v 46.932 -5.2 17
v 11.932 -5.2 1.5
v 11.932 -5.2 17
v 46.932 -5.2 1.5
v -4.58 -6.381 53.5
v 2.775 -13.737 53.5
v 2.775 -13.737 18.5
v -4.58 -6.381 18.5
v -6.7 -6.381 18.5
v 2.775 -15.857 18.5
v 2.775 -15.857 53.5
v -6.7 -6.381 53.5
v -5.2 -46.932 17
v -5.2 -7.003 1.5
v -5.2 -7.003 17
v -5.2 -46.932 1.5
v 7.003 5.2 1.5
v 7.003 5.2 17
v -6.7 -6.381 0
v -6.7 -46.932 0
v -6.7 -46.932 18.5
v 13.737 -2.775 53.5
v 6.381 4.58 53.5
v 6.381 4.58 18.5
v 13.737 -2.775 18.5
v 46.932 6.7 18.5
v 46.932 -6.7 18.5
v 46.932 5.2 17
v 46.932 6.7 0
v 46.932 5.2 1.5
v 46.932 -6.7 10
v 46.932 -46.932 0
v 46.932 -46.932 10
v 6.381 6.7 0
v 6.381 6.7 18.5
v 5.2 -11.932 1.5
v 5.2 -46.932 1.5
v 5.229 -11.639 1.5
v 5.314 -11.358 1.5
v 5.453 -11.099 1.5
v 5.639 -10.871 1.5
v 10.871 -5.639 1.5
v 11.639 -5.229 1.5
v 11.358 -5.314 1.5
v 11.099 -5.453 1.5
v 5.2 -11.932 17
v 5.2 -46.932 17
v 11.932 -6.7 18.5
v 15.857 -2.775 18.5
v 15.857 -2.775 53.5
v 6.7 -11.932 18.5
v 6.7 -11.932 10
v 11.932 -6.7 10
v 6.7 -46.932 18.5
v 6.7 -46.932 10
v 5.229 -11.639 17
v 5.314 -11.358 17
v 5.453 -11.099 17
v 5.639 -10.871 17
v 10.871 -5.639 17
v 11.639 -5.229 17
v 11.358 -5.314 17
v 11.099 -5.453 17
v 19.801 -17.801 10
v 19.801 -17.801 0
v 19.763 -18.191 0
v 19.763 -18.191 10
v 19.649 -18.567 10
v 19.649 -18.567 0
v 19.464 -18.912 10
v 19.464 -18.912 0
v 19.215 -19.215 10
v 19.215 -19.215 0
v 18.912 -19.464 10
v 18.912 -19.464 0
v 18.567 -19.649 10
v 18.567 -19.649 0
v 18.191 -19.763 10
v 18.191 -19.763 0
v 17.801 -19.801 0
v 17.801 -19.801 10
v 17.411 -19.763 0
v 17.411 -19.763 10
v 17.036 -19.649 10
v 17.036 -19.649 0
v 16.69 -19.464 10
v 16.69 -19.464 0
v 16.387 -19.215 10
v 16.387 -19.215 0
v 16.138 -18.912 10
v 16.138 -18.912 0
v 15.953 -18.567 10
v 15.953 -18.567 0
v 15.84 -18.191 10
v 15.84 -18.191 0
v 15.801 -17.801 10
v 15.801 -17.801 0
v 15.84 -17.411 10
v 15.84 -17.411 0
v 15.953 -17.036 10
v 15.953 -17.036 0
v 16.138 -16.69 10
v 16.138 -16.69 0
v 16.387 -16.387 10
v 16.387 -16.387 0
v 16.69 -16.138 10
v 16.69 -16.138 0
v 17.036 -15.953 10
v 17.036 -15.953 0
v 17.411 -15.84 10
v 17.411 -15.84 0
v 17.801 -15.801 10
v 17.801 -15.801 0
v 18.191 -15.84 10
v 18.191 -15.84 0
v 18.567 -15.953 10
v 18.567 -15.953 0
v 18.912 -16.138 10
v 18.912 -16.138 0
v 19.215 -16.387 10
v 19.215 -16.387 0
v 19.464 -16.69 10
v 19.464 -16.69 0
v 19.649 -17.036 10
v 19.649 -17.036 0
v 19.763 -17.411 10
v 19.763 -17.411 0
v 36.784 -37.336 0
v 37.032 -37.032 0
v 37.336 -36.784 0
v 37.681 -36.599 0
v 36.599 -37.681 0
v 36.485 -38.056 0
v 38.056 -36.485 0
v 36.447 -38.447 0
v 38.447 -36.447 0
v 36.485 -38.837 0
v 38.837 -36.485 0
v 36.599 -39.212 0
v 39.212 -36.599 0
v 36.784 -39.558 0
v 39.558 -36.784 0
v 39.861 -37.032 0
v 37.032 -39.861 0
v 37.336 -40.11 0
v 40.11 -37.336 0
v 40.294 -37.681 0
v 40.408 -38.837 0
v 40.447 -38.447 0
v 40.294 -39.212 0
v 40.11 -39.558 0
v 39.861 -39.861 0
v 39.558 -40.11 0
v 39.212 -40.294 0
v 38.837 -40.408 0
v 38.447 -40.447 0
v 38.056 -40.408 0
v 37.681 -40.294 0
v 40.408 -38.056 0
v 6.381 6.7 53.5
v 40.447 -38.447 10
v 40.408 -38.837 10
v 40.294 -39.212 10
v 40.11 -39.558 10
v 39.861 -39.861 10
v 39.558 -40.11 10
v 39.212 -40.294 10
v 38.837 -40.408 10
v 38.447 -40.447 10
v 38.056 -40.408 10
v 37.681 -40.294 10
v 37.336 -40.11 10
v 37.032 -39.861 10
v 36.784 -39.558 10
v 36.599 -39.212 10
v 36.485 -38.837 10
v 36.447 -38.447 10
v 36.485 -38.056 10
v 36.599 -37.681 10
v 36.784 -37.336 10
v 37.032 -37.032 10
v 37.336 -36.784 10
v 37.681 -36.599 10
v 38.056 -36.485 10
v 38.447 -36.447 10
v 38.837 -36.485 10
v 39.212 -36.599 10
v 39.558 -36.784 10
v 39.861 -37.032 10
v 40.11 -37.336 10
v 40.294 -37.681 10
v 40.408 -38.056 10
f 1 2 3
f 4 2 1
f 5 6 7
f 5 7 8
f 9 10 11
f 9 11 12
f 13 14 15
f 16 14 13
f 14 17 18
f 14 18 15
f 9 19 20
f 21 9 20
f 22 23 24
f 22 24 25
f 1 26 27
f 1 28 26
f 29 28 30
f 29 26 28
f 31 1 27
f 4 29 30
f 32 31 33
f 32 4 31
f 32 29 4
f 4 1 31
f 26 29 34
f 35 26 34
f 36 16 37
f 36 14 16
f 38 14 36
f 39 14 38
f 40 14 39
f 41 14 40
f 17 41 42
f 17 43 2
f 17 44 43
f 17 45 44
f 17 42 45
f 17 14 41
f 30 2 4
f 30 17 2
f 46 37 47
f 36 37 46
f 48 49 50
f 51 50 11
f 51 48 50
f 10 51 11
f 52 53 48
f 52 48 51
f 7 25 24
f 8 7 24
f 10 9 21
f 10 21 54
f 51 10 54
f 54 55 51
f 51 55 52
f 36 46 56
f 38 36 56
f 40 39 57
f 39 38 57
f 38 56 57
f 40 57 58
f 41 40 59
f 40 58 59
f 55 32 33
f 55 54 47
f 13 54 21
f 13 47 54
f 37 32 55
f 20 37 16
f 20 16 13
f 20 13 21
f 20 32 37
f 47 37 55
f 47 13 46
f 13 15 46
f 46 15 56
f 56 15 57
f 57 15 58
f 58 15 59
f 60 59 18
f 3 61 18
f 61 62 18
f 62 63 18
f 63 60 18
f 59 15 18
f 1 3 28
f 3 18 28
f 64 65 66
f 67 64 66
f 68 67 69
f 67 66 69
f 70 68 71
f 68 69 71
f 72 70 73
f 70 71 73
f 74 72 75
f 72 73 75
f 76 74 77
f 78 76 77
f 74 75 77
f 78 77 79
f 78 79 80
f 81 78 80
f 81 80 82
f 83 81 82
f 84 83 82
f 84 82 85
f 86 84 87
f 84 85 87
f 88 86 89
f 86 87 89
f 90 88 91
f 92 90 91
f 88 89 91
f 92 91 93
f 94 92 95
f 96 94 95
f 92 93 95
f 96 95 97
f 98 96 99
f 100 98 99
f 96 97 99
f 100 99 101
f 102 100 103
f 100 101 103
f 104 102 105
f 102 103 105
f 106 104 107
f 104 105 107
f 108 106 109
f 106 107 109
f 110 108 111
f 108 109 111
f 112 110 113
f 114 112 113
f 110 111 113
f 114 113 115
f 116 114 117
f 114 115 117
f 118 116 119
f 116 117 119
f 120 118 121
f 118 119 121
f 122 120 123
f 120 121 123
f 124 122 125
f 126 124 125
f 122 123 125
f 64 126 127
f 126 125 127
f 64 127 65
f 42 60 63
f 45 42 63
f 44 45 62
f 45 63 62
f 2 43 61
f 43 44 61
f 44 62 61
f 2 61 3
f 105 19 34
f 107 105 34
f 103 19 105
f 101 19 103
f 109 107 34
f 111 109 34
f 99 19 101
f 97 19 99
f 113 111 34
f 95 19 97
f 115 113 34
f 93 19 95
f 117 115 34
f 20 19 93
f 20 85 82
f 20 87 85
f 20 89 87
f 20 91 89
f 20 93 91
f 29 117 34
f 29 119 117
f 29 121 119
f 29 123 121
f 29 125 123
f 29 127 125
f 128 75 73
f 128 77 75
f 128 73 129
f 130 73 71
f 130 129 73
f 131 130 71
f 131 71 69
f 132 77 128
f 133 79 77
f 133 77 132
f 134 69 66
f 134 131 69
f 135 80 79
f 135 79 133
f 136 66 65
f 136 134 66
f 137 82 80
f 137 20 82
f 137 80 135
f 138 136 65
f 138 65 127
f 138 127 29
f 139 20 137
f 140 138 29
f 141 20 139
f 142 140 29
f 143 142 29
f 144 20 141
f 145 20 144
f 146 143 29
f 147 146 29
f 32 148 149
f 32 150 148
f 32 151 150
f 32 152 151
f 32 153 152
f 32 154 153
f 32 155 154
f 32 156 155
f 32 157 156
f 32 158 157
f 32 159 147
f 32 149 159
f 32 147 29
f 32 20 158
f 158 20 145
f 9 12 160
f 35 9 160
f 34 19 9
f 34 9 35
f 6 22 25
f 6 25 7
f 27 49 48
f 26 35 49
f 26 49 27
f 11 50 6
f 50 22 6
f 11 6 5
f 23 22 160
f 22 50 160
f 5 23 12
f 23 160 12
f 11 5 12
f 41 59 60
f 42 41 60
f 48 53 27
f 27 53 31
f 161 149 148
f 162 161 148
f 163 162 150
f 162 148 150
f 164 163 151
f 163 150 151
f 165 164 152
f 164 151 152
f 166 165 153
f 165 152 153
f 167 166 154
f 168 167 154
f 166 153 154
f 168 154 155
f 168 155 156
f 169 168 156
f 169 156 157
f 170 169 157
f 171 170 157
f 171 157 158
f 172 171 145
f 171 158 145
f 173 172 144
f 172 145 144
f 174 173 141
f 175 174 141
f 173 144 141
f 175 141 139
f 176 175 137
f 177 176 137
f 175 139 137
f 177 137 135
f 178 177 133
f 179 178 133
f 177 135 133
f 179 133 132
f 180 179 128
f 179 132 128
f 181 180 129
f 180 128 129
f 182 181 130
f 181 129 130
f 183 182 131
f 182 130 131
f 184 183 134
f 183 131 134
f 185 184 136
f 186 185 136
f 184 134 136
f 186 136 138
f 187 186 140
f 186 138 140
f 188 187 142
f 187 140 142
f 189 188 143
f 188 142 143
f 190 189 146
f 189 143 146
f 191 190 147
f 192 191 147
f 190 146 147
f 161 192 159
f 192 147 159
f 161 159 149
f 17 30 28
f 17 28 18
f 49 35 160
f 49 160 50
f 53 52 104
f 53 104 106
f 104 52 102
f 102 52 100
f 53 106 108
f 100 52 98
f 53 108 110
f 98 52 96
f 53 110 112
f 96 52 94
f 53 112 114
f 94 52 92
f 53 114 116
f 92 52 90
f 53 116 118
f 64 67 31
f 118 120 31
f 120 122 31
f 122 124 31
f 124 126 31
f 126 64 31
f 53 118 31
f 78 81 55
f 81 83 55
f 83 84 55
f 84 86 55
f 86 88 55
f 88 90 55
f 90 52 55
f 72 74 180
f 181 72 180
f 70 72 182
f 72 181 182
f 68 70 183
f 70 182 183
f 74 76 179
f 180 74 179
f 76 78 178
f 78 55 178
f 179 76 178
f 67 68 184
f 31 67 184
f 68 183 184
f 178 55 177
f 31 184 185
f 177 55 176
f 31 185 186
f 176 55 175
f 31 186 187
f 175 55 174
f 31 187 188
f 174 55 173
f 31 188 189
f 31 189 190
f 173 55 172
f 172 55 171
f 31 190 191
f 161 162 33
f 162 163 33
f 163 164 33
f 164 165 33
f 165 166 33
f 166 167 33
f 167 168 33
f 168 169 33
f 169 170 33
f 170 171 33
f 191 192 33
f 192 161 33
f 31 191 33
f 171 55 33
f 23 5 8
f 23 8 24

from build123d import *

# Parameters (mm, degrees)
PAD002_DEPTH    = 18.5
THICKNESS001_T  = -1.5
PAD003_DEPTH    = 35
POCKET001_DEPTH = 35
SKETCH006_R     = 2
PAD004_DEPTH    = 10


with BuildPart() as part:
    # Sketch003 → Pad002 (new body)
    with BuildSketch(Plane.XY):
        Polygon((-6.7, -6.381475), (-6.7, -46.931937), (6.7, -46.931937), (6.7, -11.931937), (11.931937, -6.7), (46.931937, -6.7), (46.931937, 6.7), (6.381475, 6.7), align=None)
    extrude(amount=PAD002_DEPTH)

    # Thickness001
    thickness001_openings = [part.faces().sort_by_distance(p)[0] for p in [
        (0, -46.931937, 9.25),
        (46.931937, 0, 9.25),
    ]]
    offset(amount=THICKNESS001_T, openings=thickness001_openings)

    # Sketch004 (on Face8 of Thickness001) → Pad003 (join)
    with BuildSketch(Plane.XY.offset(18.5)):
        Polygon((-6.7, -6.381475), (6.381475, 6.7), (15.856706, -2.775231), (2.775231, -15.856706), align=None)
    extrude(amount=PAD003_DEPTH)

    # Sketch005 (on Face22 of Pad003) → Pocket001 (cut)
    with BuildSketch(Plane.XY.offset(53.5)):
        Polygon((-4.58, -6.381475), (6.381475, 4.58), (13.736706, -2.775231), (2.775231, -13.736706), align=None)
    extrude(amount=-POCKET001_DEPTH, mode=Mode.SUBTRACT)

    # Sketch006 (on Face4 of Pocket001) → Pad004 (join)
    with BuildSketch(Plane(origin=(0, 0, 0), x_dir=(1, 0, 0), z_dir=(0, 0, -1))):
        Polygon((6.7, 46.931937), (6.7, 11.931937), (11.931937, 6.7), (46.931937, 6.7), (46.931937, 46.931937), align=None)
        with Locations((17.80125, 17.80125)):
            Circle(SKETCH006_R, mode=Mode.SUBTRACT)
        with Locations((38.446656, 38.446656)):
            Circle(SKETCH006_R, mode=Mode.SUBTRACT)
    extrude(amount=-PAD004_DEPTH)


solid = part.part
